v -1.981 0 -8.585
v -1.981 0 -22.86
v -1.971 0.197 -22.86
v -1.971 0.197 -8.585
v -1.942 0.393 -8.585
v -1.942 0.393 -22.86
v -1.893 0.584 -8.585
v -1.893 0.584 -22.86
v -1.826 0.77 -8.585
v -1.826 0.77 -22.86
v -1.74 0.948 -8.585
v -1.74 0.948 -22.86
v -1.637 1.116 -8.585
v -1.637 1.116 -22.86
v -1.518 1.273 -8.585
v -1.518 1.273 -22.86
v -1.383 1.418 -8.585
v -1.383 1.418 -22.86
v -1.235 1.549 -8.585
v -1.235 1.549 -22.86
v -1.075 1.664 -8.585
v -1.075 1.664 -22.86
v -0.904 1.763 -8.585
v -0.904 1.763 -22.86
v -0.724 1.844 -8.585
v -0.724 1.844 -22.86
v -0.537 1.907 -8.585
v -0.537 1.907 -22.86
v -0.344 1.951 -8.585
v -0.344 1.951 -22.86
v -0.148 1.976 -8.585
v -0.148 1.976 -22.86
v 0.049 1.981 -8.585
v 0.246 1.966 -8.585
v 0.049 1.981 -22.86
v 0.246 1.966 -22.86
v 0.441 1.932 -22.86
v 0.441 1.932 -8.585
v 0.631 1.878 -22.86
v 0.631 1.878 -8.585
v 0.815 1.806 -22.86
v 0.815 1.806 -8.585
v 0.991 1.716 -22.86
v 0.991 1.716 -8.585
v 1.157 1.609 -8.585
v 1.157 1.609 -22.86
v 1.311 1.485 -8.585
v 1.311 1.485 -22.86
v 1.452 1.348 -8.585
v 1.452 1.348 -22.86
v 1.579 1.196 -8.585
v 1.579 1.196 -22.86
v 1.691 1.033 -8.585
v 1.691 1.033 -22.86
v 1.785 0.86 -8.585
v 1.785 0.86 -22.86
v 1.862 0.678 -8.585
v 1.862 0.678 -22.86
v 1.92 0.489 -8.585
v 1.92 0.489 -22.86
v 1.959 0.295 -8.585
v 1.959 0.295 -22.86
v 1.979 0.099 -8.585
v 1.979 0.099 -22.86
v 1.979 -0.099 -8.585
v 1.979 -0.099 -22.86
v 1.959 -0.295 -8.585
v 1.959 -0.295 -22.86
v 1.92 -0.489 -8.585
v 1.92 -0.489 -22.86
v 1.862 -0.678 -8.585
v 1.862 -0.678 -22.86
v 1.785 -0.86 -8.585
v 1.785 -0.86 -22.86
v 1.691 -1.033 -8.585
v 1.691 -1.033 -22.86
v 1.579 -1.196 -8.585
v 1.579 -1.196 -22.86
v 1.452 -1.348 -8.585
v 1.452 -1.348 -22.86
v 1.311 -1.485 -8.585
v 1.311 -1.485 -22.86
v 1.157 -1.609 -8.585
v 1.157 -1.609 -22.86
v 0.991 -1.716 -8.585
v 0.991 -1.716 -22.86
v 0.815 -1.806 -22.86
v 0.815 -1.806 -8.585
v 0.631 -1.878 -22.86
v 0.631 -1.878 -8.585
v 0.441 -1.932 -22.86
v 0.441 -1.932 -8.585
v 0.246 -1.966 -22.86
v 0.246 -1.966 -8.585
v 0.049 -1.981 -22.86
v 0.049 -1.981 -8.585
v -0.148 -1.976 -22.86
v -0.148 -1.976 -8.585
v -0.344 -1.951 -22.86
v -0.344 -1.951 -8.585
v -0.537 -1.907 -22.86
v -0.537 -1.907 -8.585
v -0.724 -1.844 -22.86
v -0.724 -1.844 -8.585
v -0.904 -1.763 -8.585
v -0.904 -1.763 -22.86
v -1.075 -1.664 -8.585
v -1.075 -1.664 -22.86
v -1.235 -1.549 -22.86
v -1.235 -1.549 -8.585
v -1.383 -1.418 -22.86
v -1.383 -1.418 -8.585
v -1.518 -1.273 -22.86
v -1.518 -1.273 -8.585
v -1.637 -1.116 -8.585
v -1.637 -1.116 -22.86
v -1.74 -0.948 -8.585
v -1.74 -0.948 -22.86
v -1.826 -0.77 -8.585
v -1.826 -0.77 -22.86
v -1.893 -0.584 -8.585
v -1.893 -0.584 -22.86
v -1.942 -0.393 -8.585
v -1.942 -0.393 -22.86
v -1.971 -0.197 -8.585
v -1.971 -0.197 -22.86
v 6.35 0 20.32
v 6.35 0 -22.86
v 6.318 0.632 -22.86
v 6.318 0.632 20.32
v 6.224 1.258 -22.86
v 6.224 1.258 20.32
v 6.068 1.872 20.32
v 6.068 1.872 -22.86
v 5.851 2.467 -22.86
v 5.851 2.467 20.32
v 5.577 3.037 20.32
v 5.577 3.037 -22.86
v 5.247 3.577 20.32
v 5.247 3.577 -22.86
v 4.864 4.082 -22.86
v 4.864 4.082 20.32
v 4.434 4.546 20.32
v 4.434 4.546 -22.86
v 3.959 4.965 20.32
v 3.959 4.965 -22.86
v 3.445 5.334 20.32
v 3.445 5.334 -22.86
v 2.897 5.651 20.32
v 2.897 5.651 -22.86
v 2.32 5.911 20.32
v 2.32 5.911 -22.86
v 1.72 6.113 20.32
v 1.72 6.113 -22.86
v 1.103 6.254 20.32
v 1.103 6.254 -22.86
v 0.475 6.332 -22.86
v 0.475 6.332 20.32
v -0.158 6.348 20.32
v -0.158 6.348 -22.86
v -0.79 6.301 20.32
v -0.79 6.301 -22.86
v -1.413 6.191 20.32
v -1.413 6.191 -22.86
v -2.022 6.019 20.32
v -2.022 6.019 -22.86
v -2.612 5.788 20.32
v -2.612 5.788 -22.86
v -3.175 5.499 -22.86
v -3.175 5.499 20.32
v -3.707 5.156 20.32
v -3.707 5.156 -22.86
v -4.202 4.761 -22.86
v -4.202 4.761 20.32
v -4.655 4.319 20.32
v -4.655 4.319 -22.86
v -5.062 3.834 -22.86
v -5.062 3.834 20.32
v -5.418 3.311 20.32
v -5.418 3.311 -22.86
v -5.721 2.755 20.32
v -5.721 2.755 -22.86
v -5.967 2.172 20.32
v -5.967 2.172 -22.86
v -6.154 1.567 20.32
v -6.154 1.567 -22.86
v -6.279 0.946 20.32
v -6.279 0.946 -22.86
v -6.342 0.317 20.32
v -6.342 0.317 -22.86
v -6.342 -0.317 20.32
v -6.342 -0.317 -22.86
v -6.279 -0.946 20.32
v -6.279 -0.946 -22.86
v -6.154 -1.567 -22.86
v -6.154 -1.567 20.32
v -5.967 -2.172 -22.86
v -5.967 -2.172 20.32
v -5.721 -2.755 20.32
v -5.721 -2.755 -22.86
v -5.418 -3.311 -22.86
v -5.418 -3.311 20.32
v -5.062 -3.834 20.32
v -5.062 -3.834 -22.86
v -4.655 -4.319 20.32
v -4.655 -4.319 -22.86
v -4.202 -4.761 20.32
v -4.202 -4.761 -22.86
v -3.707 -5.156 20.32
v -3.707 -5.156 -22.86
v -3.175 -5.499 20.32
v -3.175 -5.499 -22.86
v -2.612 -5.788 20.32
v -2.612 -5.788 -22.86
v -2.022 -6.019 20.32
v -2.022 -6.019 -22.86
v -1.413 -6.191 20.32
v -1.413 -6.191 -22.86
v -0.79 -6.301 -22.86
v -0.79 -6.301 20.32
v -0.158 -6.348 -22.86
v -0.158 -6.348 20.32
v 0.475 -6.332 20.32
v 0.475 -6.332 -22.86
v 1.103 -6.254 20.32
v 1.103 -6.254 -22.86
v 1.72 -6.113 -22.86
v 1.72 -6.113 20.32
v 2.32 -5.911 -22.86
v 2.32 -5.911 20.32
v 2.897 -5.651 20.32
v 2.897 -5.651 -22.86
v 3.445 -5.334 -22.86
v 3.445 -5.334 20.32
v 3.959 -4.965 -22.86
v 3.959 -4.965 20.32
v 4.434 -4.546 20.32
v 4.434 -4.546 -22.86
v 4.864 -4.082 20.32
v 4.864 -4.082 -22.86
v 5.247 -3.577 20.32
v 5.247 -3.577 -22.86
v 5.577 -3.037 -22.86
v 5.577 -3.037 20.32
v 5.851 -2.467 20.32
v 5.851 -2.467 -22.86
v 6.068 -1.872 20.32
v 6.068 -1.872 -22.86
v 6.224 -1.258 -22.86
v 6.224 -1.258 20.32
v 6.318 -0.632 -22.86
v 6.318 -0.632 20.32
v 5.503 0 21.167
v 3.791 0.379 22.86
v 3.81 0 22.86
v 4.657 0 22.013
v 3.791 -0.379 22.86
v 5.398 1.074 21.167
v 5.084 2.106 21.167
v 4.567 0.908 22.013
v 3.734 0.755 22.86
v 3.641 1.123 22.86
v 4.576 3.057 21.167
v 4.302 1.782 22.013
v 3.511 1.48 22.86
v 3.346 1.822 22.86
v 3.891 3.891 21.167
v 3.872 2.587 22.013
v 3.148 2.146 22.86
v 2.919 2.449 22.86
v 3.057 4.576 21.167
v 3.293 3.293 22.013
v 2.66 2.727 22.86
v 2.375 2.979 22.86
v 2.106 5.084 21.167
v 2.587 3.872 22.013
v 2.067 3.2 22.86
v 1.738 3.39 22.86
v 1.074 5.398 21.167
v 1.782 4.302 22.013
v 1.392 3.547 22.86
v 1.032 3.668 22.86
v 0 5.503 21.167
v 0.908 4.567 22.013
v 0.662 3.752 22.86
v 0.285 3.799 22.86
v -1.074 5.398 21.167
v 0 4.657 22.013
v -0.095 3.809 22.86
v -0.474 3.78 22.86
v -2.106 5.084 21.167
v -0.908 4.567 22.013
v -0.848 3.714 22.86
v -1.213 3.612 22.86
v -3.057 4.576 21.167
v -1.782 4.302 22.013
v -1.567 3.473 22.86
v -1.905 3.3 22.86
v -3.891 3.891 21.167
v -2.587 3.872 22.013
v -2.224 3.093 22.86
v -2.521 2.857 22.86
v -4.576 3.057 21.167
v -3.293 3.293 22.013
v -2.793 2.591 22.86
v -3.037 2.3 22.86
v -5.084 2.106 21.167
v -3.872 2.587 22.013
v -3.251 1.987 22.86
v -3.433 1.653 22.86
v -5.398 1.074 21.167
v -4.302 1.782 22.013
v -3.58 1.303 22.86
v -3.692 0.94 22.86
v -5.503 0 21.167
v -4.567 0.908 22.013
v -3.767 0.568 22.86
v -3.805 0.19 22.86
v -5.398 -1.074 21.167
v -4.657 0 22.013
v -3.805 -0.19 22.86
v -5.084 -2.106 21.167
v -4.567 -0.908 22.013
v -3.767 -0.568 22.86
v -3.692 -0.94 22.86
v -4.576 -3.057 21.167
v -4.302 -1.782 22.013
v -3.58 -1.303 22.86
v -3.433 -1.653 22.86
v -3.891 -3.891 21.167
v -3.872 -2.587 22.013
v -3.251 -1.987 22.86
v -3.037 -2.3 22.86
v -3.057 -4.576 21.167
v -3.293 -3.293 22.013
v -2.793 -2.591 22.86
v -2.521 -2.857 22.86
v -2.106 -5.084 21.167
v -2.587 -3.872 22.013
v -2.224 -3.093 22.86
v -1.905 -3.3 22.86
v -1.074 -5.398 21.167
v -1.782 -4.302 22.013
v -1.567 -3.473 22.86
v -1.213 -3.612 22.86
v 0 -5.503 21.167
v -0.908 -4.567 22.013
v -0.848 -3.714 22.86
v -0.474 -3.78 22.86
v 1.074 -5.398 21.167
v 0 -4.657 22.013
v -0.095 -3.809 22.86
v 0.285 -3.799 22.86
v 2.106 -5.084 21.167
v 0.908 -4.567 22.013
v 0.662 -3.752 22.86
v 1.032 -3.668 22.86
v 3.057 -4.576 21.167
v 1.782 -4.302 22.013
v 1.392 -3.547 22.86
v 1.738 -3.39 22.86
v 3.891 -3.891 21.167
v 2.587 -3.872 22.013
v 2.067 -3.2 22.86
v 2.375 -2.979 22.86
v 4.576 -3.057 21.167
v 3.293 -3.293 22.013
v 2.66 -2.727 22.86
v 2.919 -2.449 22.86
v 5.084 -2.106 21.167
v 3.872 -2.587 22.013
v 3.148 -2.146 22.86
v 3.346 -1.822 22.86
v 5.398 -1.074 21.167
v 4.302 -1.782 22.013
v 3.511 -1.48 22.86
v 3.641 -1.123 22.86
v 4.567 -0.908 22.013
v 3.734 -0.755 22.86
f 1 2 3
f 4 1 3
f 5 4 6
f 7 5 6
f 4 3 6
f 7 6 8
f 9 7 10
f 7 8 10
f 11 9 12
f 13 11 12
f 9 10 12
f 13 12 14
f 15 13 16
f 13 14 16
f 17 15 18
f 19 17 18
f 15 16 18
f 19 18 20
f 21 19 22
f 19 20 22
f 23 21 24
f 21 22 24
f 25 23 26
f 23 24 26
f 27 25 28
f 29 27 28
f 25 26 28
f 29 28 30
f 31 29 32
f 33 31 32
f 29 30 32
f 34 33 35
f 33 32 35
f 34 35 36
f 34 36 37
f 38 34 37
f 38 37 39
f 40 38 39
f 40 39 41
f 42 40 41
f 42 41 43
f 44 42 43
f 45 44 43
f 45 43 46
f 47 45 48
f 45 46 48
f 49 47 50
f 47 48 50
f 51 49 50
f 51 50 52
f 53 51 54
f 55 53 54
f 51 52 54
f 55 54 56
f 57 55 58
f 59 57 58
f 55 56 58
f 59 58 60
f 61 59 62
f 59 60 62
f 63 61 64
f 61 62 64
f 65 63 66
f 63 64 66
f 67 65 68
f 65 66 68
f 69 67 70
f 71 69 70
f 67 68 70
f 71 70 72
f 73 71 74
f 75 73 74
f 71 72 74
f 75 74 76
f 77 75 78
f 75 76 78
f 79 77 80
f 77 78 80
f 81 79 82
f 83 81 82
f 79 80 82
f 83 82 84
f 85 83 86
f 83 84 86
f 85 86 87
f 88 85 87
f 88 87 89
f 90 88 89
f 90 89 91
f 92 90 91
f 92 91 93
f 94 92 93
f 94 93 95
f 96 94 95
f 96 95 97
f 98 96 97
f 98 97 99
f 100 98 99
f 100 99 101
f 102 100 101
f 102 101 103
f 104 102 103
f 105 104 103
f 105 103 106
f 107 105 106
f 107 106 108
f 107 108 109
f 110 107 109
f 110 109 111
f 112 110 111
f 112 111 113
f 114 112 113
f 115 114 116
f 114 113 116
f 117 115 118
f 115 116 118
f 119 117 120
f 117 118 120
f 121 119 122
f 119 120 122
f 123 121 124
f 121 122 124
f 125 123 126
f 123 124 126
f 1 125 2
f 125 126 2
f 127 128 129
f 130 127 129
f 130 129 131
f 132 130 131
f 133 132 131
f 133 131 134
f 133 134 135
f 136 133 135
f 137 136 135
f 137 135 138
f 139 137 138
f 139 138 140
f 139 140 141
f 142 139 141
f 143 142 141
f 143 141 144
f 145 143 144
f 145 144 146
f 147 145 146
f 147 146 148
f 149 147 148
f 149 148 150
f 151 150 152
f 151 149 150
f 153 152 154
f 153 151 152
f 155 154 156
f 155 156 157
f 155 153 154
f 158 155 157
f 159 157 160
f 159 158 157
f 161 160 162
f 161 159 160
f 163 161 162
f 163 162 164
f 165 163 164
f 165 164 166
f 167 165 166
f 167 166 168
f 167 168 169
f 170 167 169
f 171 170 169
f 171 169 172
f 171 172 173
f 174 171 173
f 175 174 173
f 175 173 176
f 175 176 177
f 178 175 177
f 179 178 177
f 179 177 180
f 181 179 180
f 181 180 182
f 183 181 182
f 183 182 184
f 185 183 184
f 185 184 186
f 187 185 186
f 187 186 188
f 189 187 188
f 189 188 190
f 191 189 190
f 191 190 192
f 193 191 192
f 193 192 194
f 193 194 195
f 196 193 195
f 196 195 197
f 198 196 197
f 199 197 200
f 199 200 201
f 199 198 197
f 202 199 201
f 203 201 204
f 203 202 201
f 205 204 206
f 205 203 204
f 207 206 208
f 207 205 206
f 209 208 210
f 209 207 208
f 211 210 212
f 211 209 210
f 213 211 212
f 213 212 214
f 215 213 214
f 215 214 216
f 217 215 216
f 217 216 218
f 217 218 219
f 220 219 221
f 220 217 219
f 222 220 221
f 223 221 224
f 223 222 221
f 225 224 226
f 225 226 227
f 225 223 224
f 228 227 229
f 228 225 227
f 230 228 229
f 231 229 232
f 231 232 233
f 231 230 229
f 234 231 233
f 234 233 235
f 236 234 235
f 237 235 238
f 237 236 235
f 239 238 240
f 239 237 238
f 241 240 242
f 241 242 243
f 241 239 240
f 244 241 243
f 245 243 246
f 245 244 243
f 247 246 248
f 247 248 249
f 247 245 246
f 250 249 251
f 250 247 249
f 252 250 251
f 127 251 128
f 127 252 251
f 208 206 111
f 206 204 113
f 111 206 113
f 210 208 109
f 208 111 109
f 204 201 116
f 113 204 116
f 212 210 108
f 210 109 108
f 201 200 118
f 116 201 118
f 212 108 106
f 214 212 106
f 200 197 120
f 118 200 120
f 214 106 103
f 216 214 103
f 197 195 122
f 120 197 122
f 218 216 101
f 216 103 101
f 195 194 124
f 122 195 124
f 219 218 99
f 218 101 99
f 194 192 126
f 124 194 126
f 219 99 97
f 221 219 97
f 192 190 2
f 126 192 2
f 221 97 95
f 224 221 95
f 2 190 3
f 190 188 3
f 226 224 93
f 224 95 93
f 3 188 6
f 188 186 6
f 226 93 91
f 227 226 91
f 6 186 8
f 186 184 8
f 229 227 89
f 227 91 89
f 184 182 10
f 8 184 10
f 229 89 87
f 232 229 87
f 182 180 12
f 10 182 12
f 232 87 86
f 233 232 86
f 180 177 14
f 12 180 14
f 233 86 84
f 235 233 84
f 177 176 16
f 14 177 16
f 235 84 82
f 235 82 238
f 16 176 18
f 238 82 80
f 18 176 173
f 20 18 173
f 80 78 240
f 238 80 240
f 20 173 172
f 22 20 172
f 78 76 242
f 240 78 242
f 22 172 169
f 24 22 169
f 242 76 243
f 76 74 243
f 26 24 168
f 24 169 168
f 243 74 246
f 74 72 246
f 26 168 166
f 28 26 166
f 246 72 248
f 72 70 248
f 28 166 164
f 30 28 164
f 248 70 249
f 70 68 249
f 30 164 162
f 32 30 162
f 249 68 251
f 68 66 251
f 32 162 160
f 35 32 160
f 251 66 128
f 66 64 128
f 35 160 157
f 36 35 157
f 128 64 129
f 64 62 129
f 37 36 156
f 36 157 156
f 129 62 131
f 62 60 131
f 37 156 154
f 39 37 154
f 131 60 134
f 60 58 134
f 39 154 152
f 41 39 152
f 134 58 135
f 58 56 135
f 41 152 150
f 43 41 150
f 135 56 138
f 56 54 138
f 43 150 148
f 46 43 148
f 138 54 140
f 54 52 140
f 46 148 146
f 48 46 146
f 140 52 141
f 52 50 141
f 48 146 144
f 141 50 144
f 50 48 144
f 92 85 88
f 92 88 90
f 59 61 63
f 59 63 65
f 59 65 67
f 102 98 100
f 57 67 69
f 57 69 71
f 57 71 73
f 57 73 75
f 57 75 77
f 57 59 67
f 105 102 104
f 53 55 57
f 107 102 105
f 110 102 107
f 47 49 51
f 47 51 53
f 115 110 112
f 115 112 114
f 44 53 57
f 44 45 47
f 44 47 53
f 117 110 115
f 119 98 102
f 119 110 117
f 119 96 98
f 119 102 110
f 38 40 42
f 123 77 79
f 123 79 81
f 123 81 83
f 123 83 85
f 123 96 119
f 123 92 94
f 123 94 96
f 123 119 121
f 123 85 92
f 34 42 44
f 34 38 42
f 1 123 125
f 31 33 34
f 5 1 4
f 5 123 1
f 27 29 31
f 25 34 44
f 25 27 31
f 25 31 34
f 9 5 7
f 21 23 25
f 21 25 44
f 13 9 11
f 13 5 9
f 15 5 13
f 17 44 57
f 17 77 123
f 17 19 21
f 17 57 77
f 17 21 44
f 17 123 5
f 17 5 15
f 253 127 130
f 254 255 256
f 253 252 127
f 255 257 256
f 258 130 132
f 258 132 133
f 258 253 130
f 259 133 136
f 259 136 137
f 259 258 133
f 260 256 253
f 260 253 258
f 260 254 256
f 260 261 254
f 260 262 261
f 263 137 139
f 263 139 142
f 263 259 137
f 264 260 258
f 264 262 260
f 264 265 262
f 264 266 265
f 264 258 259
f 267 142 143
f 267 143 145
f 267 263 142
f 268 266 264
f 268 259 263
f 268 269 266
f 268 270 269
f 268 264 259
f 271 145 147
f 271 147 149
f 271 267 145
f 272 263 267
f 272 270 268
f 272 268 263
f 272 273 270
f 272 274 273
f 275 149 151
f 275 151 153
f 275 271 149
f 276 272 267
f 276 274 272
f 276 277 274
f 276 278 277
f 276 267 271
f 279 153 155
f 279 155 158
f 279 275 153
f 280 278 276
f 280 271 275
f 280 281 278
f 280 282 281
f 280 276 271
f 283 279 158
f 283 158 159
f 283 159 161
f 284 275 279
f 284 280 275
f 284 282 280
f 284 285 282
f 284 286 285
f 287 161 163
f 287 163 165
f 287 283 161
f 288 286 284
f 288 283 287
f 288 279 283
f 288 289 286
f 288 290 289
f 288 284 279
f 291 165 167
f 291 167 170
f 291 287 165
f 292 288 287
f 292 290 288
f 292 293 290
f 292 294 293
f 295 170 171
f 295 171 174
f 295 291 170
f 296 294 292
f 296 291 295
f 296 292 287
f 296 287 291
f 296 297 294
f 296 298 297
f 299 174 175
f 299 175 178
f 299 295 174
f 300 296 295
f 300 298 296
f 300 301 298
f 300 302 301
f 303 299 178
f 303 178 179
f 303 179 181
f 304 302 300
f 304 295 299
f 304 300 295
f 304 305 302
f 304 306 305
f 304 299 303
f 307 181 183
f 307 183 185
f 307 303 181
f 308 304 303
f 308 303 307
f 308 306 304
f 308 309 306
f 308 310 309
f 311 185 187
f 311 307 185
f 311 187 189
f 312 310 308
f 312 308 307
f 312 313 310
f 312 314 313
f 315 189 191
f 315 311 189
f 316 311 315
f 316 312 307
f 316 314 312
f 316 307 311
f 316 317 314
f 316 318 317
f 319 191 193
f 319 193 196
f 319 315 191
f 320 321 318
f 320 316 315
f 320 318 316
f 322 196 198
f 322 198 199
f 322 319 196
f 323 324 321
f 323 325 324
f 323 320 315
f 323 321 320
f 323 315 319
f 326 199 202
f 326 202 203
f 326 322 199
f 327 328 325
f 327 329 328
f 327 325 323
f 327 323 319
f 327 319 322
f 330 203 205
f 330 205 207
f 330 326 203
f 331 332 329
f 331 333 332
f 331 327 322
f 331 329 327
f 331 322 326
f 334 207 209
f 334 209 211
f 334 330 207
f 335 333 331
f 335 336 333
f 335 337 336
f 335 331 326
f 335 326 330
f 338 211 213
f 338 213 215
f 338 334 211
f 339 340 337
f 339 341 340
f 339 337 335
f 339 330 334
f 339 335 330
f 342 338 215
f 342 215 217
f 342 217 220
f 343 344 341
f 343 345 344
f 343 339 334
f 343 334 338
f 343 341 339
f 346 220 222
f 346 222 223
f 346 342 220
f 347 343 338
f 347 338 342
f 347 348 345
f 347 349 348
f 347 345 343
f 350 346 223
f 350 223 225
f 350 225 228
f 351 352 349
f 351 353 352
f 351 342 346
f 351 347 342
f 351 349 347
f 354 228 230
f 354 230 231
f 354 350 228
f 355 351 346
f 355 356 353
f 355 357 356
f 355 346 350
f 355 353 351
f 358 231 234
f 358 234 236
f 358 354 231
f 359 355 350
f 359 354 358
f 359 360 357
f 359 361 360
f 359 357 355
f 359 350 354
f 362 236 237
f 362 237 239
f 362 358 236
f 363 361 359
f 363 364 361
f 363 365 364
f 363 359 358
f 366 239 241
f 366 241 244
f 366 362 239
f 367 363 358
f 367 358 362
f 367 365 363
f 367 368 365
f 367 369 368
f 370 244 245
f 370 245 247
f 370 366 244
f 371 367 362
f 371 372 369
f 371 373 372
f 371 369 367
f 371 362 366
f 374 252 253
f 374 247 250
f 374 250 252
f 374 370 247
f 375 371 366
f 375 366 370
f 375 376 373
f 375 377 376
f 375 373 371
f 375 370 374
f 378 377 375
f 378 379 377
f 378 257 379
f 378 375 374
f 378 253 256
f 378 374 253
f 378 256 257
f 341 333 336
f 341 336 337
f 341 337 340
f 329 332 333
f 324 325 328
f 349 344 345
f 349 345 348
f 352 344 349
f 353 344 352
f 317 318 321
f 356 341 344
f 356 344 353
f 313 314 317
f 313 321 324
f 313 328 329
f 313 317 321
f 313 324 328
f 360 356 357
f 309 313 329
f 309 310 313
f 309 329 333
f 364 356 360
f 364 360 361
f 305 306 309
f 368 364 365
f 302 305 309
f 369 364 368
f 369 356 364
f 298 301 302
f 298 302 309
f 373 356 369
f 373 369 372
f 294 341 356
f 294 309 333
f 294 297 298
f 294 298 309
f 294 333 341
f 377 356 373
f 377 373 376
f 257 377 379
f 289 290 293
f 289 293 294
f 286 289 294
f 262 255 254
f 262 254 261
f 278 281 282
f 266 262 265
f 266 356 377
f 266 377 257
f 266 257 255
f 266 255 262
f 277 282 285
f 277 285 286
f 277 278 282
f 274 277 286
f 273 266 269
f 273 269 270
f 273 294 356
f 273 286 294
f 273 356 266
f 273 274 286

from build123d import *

# Parameters (mm, degrees)
SKETCH1_R           = 6.35
BOSS_EXTRUDE1_DEPTH = 22.86
CHAMFER1_SIZE       = 2.54
SKETCH2_R           = 1.9812
CUT_EXTRUDE1_DEPTH  = 14.2748


with BuildPart() as part:
    # Sketch1 → Boss-Extrude1 (new, symmetric)
    with BuildSketch(Plane.XY):
        Circle(SKETCH1_R)
    extrude(amount=BOSS_EXTRUDE1_DEPTH, both=True)

    # Chamfer1
    chamfer1_edges = [part.edges().sort_by_distance(p)[0] for p in [
        (-6.35, 0, 22.86),
    ]]
    chamfer(chamfer1_edges, length=CHAMFER1_SIZE)

    # Sketch2 → Cut-Extrude1 (cut)
    with BuildSketch(Plane(origin=(0, 0, -22.86), x_dir=(-1, 0, 0), z_dir=(0, 0, -1))):
        Circle(SKETCH2_R)
    extrude(amount=-CUT_EXTRUDE1_DEPTH, mode=Mode.SUBTRACT)


solid = part.part
